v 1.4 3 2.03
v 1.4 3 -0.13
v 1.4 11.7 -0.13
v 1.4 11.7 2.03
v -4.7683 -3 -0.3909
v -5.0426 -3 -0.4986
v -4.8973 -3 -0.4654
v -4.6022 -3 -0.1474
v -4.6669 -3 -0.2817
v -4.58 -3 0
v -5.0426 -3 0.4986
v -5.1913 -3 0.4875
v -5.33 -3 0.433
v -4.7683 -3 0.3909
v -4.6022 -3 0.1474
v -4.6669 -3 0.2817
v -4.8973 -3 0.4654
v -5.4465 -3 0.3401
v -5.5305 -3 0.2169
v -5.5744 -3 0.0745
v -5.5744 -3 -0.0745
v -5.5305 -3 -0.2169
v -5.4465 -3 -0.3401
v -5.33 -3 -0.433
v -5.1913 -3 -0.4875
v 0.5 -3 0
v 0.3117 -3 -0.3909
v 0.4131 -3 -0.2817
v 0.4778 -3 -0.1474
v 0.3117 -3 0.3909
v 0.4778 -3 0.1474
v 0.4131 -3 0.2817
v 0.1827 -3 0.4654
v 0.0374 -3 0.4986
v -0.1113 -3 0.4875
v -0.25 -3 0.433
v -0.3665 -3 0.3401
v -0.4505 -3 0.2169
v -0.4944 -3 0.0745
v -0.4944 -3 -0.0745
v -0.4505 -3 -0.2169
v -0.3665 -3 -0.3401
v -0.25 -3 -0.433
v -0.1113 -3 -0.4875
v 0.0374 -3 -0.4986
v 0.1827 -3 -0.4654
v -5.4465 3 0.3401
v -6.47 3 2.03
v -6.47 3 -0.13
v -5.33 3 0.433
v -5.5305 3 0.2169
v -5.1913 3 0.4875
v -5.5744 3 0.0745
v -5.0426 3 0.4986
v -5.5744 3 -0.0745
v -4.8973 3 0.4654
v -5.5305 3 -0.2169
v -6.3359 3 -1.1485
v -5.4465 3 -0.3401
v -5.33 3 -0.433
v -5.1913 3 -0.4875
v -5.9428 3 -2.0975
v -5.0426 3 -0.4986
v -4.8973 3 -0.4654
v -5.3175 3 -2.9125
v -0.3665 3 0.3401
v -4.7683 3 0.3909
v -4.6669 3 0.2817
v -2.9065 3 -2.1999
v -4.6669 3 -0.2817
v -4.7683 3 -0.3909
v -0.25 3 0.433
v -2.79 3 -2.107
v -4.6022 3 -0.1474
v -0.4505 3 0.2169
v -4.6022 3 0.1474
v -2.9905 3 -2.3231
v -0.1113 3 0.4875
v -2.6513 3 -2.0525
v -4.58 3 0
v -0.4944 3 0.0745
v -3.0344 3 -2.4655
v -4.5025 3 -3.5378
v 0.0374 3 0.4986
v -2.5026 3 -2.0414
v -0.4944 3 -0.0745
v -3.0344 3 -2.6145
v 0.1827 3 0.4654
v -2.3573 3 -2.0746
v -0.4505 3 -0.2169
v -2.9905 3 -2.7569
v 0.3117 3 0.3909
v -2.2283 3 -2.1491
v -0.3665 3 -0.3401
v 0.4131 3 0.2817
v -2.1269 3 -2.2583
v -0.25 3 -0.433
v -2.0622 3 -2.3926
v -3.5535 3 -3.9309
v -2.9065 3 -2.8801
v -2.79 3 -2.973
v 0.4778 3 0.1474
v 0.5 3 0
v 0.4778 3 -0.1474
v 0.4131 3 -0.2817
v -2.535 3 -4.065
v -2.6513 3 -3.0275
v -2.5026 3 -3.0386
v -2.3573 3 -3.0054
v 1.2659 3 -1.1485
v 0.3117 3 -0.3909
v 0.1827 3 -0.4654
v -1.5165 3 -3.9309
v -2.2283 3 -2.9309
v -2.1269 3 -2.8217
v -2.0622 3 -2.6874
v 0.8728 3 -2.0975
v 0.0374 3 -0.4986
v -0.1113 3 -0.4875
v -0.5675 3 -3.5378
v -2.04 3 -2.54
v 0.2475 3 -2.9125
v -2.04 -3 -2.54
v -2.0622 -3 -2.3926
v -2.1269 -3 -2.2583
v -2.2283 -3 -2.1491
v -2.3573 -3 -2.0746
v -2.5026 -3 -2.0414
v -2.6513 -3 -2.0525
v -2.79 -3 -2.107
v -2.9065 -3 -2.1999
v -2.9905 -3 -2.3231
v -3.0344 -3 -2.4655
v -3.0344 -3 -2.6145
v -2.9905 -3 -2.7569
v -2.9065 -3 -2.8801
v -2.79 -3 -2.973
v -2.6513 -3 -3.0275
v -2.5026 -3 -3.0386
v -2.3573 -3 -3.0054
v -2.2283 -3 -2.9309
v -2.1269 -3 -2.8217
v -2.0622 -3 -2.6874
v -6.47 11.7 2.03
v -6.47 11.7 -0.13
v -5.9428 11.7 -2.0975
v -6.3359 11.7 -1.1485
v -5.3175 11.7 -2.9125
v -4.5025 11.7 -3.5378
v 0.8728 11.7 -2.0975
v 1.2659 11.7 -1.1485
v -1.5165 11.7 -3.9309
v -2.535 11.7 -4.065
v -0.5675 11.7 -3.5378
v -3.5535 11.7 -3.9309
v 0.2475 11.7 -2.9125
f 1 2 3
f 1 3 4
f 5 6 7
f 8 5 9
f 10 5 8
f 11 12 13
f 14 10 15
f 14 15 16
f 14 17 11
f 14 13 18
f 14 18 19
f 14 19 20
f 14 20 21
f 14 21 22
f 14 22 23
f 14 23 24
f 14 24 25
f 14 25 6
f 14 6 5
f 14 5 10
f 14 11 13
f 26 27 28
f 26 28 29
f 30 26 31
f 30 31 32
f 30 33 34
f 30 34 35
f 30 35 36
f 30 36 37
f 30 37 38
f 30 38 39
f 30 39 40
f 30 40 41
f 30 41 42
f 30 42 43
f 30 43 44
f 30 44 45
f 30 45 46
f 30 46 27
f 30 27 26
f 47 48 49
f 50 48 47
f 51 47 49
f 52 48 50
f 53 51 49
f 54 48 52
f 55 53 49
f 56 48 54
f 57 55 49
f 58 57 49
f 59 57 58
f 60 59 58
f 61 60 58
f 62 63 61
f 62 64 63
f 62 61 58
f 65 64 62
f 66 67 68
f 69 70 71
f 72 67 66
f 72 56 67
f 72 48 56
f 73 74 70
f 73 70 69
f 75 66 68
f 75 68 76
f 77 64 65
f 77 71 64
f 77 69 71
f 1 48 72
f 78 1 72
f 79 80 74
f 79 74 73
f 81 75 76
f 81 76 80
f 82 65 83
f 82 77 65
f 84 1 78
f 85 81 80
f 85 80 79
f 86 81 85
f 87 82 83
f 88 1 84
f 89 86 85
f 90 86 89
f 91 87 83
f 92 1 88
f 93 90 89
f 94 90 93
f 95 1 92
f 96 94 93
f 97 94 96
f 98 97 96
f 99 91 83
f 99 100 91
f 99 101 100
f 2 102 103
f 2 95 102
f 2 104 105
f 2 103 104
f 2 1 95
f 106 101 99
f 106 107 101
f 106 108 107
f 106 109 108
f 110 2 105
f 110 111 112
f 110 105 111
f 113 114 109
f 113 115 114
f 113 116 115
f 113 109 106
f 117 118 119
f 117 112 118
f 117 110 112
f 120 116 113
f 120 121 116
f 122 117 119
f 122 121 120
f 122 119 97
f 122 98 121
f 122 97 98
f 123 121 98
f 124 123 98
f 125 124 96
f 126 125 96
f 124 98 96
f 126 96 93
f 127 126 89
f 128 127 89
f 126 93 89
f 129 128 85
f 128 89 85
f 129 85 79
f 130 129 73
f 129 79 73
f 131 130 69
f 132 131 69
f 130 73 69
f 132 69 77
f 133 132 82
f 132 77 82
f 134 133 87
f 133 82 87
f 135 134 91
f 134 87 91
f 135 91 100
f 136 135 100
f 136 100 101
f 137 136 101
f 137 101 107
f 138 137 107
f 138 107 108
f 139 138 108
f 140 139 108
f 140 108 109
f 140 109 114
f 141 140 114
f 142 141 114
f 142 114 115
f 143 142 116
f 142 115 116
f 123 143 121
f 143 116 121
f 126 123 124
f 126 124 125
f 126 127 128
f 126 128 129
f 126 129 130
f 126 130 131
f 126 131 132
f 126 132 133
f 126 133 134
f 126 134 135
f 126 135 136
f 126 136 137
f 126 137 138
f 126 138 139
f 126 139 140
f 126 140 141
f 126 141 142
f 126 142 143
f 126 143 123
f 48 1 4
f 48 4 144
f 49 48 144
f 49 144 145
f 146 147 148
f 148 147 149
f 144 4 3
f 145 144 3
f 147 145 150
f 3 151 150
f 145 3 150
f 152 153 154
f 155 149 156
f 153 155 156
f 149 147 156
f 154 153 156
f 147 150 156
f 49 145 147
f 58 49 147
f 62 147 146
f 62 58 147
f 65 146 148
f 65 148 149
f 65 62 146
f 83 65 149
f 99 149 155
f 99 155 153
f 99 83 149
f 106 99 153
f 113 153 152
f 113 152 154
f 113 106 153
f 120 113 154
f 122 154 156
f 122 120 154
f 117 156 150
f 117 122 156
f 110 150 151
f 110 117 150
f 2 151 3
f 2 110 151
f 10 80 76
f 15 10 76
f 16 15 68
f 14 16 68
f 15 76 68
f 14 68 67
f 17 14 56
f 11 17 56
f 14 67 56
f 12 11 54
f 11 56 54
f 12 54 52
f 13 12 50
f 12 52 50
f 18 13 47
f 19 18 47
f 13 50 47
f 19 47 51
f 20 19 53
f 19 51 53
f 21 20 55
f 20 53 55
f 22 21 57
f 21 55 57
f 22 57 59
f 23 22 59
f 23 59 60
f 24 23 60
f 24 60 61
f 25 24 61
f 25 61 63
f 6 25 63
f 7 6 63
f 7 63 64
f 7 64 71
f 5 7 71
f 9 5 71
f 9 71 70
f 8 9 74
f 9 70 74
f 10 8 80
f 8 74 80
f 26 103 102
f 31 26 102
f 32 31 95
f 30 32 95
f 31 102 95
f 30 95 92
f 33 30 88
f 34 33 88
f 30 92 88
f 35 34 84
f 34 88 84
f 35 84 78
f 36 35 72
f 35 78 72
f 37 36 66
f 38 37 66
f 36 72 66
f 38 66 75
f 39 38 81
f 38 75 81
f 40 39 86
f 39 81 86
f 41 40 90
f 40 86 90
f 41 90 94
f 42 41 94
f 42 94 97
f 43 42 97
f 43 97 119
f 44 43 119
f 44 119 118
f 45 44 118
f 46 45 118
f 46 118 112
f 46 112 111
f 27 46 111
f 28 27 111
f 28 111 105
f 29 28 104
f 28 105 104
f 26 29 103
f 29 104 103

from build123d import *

# Parameters (mm, degrees)
BOSS_EXTRUDE_1_DEPTH = 8.7
SKETCH_2_R           = 0.5
BOSS_EXTRUDE_2_DEPTH = 6


with BuildPart() as part:
    # Sketch 1 → Boss-Extrude 1 (new body)
    with BuildSketch(Plane.ZX.offset(3)):
        with BuildLine():
            Line((-0.13, 1.4), (2.03, 1.4))
            Line((2.03, 1.4), (2.03, -6.47))
            Line((2.03, -6.47), (-0.13, -6.47))
            ThreePointArc((-0.13, -6.47), (-4.065, -2.535), (-0.13, 1.4))
        make_face()
    extrude(amount=BOSS_EXTRUDE_1_DEPTH)

    # Sketch 2 → Boss-Extrude 2 (add)
    with BuildSketch(Plane.XZ.offset(-3)):
        Circle(SKETCH_2_R)
        with Locations((-2.54, -2.54)):
            Circle(SKETCH_2_R)
        with Locations((-5.08, 0)):
            Circle(SKETCH_2_R)
    extrude(amount=BOSS_EXTRUDE_2_DEPTH)


solid = part.part
